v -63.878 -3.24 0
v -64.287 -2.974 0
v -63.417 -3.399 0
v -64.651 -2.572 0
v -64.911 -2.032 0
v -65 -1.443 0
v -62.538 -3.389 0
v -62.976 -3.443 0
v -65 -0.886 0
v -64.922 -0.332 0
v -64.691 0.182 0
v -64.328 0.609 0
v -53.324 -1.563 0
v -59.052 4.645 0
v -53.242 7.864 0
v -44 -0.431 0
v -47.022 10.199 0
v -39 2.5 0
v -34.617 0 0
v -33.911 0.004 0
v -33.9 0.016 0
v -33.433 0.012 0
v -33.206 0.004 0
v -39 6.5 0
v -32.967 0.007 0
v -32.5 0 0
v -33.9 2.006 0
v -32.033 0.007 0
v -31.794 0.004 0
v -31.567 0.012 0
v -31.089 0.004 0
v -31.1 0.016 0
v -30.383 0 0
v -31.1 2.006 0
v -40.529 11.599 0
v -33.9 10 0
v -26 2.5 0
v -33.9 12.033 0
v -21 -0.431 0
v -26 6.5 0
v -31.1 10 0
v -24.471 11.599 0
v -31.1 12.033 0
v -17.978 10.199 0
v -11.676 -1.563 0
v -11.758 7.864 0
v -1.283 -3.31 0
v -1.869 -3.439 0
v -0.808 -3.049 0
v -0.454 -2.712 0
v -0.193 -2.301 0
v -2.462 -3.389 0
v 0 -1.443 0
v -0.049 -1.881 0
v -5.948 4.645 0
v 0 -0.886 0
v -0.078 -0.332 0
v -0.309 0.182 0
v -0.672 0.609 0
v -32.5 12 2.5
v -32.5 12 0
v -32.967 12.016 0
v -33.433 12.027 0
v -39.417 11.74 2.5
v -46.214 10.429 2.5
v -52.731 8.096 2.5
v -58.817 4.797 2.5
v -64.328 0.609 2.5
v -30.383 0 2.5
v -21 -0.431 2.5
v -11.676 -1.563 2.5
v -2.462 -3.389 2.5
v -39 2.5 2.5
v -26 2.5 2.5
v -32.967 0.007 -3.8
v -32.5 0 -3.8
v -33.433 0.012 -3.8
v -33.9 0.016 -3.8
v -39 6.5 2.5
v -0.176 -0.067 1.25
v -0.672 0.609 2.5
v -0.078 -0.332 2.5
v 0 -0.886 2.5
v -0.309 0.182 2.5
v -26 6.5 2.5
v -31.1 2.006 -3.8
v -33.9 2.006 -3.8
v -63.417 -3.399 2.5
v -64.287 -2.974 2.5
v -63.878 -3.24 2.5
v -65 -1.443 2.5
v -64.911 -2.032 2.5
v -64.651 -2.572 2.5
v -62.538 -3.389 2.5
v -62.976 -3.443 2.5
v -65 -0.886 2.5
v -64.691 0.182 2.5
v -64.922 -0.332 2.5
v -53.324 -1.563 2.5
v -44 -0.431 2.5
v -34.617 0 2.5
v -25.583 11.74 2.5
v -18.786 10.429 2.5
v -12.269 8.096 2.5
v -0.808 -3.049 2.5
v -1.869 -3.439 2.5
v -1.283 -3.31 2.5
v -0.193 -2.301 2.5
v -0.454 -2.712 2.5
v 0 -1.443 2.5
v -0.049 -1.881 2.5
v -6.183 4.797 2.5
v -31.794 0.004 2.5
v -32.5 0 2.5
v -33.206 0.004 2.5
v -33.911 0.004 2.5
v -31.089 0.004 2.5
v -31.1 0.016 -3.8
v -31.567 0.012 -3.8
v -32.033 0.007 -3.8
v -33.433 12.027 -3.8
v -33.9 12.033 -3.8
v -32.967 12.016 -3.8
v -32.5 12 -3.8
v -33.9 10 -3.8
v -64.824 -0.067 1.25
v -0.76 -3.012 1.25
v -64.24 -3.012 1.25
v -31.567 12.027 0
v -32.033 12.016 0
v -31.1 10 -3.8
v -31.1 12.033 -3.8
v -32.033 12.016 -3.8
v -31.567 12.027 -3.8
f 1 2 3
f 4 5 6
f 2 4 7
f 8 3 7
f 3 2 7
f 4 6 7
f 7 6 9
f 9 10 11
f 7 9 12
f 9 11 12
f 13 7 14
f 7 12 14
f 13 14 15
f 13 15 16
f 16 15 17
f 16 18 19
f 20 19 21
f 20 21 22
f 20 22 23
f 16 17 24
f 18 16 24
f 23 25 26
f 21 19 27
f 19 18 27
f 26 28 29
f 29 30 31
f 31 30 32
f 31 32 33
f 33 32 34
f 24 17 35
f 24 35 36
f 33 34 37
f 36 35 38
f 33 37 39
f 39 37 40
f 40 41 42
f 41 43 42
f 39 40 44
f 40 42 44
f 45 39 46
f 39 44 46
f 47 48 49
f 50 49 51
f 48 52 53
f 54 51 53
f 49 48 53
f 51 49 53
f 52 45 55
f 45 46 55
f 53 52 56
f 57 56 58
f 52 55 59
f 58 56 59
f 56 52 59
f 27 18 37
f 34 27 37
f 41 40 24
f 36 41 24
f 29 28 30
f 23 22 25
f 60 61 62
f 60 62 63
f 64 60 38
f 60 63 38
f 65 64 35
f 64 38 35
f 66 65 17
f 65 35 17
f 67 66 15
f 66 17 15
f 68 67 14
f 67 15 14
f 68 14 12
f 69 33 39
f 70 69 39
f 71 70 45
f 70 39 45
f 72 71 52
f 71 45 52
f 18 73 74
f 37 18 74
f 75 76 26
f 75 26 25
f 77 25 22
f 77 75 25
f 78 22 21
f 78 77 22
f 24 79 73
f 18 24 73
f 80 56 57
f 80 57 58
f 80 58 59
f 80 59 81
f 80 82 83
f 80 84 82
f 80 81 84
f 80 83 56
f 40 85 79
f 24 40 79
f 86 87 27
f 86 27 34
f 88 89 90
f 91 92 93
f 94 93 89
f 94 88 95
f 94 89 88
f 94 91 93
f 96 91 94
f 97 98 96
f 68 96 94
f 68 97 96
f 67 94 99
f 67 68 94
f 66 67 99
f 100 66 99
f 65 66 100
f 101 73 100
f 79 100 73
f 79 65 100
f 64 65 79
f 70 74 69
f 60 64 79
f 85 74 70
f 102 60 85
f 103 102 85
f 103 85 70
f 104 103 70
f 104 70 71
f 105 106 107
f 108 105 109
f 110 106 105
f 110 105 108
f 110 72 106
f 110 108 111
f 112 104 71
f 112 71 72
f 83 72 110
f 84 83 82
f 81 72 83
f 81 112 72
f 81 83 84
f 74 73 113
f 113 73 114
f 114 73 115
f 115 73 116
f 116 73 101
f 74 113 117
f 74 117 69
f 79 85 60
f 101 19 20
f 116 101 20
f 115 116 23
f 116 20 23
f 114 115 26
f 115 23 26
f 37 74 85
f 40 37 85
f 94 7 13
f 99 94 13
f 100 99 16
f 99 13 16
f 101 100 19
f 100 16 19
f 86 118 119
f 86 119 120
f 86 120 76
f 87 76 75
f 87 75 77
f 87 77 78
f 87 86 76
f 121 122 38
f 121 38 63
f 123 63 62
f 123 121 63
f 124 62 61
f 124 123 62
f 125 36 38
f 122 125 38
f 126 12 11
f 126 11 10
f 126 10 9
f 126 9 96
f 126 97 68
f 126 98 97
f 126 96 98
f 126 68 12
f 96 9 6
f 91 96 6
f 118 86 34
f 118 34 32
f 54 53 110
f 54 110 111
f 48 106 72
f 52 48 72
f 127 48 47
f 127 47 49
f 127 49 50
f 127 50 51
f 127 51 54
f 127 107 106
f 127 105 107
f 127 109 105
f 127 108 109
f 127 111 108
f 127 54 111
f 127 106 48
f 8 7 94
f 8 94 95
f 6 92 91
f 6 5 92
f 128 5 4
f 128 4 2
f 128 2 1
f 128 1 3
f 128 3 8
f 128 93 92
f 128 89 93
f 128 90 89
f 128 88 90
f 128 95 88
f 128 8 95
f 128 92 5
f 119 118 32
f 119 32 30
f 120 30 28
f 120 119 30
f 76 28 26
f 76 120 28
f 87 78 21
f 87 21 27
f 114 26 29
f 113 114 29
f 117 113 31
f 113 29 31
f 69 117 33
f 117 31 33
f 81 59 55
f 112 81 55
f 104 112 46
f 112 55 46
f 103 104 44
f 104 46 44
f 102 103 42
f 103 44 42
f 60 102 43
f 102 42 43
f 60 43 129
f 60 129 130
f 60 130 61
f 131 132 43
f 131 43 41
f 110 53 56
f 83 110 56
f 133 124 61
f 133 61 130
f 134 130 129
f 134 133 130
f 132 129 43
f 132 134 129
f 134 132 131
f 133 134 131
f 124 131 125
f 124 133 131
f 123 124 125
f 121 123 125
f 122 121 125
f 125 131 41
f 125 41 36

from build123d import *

# Parameters (mm, degrees)
BOSS_EXTRUDE1_DEPTH = 2.5
SKETCH2_W           = 13
SKETCH2_H           = 4
CUT_EXTRUDE3_DEPTH  = 2.5
BOSS_EXTRUDE2_START = 3.8
BOSS_EXTRUDE2_DEPTH = 3.8
VARFILLET1_R        = 2


with BuildPart() as part:
    # Sketch1 → Boss-Extrude1 (new body)
    with BuildSketch(Plane.XY):
        with BuildLine():
            Line((0, -4), (0, 0))
            ThreePointArc((0, 0), (-15.056525796, 9.23232597), (-32.5, 12))
            ThreePointArc((-32.5, 12), (-49.943474204, 9.23232597), (-65, 0))
            Line((-65, 0), (-65, -4))
            ThreePointArc((-65, -4), (-48.881086926, -0.934918729), (-32.5, 0))
            ThreePointArc((-32.5, 0), (-16.118913074, -0.934918729), (0, -4))
        make_face()
    extrude(amount=BOSS_EXTRUDE1_DEPTH)

    # Sketch2 → Cut-Extrude3 (cut)
    with BuildSketch(Plane.XY.offset(2.5)):
        with Locations((-32.5, 4.5)):
            Rectangle(SKETCH2_W, SKETCH2_H)
    extrude(amount=-CUT_EXTRUDE3_DEPTH, mode=Mode.SUBTRACT)

    # Sketch3 → Boss-Extrude2 (add)
    with BuildSketch(Plane(origin=(0, 0, 0), x_dir=(-1, 0, 0), z_dir=(0, 0, -1)).offset(BOSS_EXTRUDE2_START)):
        with BuildLine():
            ThreePointArc((33.9, 12.032943433), (33.199872595, 12.021886063), (32.5, 12))
            ThreePointArc((32.5, 12), (31.800127405, 12.021886063), (31.1, 12.032943433))
            Line((31.1, 12.032943433), (31.1, 10))
            Line((31.1, 10), (33.9, 10))
            Line((33.9, 10), (33.9, 12.032943433))
        make_face()
        with BuildLine():
            ThreePointArc((31.1, 0.015701129), (31.800023358, 0.009933302), (32.5, 0))
            ThreePointArc((32.5, 0), (33.199976642, 0.009933302), (33.9, 0.015701129))
            Line((33.9, 0.015701129), (33.9, 2.005619302))
            Line((33.9, 2.005619302), (31.1, 2.005619302))
            Line((31.1, 2.005619302), (31.1, 0.015701129))
        make_face()
    extrude(amount=-BOSS_EXTRUDE2_DEPTH)

    # VarFillet1
    varfillet1_edges = [part.edges().sort_by_distance(p)[0] for p in [
        (0, -4, 1.25),
        (0, 0, 1.25),
        (-65, -4, 1.25),
        (-65, 0, 1.25),
    ]]
    fillet(varfillet1_edges, radius=VARFILLET1_R)


solid = part.part
